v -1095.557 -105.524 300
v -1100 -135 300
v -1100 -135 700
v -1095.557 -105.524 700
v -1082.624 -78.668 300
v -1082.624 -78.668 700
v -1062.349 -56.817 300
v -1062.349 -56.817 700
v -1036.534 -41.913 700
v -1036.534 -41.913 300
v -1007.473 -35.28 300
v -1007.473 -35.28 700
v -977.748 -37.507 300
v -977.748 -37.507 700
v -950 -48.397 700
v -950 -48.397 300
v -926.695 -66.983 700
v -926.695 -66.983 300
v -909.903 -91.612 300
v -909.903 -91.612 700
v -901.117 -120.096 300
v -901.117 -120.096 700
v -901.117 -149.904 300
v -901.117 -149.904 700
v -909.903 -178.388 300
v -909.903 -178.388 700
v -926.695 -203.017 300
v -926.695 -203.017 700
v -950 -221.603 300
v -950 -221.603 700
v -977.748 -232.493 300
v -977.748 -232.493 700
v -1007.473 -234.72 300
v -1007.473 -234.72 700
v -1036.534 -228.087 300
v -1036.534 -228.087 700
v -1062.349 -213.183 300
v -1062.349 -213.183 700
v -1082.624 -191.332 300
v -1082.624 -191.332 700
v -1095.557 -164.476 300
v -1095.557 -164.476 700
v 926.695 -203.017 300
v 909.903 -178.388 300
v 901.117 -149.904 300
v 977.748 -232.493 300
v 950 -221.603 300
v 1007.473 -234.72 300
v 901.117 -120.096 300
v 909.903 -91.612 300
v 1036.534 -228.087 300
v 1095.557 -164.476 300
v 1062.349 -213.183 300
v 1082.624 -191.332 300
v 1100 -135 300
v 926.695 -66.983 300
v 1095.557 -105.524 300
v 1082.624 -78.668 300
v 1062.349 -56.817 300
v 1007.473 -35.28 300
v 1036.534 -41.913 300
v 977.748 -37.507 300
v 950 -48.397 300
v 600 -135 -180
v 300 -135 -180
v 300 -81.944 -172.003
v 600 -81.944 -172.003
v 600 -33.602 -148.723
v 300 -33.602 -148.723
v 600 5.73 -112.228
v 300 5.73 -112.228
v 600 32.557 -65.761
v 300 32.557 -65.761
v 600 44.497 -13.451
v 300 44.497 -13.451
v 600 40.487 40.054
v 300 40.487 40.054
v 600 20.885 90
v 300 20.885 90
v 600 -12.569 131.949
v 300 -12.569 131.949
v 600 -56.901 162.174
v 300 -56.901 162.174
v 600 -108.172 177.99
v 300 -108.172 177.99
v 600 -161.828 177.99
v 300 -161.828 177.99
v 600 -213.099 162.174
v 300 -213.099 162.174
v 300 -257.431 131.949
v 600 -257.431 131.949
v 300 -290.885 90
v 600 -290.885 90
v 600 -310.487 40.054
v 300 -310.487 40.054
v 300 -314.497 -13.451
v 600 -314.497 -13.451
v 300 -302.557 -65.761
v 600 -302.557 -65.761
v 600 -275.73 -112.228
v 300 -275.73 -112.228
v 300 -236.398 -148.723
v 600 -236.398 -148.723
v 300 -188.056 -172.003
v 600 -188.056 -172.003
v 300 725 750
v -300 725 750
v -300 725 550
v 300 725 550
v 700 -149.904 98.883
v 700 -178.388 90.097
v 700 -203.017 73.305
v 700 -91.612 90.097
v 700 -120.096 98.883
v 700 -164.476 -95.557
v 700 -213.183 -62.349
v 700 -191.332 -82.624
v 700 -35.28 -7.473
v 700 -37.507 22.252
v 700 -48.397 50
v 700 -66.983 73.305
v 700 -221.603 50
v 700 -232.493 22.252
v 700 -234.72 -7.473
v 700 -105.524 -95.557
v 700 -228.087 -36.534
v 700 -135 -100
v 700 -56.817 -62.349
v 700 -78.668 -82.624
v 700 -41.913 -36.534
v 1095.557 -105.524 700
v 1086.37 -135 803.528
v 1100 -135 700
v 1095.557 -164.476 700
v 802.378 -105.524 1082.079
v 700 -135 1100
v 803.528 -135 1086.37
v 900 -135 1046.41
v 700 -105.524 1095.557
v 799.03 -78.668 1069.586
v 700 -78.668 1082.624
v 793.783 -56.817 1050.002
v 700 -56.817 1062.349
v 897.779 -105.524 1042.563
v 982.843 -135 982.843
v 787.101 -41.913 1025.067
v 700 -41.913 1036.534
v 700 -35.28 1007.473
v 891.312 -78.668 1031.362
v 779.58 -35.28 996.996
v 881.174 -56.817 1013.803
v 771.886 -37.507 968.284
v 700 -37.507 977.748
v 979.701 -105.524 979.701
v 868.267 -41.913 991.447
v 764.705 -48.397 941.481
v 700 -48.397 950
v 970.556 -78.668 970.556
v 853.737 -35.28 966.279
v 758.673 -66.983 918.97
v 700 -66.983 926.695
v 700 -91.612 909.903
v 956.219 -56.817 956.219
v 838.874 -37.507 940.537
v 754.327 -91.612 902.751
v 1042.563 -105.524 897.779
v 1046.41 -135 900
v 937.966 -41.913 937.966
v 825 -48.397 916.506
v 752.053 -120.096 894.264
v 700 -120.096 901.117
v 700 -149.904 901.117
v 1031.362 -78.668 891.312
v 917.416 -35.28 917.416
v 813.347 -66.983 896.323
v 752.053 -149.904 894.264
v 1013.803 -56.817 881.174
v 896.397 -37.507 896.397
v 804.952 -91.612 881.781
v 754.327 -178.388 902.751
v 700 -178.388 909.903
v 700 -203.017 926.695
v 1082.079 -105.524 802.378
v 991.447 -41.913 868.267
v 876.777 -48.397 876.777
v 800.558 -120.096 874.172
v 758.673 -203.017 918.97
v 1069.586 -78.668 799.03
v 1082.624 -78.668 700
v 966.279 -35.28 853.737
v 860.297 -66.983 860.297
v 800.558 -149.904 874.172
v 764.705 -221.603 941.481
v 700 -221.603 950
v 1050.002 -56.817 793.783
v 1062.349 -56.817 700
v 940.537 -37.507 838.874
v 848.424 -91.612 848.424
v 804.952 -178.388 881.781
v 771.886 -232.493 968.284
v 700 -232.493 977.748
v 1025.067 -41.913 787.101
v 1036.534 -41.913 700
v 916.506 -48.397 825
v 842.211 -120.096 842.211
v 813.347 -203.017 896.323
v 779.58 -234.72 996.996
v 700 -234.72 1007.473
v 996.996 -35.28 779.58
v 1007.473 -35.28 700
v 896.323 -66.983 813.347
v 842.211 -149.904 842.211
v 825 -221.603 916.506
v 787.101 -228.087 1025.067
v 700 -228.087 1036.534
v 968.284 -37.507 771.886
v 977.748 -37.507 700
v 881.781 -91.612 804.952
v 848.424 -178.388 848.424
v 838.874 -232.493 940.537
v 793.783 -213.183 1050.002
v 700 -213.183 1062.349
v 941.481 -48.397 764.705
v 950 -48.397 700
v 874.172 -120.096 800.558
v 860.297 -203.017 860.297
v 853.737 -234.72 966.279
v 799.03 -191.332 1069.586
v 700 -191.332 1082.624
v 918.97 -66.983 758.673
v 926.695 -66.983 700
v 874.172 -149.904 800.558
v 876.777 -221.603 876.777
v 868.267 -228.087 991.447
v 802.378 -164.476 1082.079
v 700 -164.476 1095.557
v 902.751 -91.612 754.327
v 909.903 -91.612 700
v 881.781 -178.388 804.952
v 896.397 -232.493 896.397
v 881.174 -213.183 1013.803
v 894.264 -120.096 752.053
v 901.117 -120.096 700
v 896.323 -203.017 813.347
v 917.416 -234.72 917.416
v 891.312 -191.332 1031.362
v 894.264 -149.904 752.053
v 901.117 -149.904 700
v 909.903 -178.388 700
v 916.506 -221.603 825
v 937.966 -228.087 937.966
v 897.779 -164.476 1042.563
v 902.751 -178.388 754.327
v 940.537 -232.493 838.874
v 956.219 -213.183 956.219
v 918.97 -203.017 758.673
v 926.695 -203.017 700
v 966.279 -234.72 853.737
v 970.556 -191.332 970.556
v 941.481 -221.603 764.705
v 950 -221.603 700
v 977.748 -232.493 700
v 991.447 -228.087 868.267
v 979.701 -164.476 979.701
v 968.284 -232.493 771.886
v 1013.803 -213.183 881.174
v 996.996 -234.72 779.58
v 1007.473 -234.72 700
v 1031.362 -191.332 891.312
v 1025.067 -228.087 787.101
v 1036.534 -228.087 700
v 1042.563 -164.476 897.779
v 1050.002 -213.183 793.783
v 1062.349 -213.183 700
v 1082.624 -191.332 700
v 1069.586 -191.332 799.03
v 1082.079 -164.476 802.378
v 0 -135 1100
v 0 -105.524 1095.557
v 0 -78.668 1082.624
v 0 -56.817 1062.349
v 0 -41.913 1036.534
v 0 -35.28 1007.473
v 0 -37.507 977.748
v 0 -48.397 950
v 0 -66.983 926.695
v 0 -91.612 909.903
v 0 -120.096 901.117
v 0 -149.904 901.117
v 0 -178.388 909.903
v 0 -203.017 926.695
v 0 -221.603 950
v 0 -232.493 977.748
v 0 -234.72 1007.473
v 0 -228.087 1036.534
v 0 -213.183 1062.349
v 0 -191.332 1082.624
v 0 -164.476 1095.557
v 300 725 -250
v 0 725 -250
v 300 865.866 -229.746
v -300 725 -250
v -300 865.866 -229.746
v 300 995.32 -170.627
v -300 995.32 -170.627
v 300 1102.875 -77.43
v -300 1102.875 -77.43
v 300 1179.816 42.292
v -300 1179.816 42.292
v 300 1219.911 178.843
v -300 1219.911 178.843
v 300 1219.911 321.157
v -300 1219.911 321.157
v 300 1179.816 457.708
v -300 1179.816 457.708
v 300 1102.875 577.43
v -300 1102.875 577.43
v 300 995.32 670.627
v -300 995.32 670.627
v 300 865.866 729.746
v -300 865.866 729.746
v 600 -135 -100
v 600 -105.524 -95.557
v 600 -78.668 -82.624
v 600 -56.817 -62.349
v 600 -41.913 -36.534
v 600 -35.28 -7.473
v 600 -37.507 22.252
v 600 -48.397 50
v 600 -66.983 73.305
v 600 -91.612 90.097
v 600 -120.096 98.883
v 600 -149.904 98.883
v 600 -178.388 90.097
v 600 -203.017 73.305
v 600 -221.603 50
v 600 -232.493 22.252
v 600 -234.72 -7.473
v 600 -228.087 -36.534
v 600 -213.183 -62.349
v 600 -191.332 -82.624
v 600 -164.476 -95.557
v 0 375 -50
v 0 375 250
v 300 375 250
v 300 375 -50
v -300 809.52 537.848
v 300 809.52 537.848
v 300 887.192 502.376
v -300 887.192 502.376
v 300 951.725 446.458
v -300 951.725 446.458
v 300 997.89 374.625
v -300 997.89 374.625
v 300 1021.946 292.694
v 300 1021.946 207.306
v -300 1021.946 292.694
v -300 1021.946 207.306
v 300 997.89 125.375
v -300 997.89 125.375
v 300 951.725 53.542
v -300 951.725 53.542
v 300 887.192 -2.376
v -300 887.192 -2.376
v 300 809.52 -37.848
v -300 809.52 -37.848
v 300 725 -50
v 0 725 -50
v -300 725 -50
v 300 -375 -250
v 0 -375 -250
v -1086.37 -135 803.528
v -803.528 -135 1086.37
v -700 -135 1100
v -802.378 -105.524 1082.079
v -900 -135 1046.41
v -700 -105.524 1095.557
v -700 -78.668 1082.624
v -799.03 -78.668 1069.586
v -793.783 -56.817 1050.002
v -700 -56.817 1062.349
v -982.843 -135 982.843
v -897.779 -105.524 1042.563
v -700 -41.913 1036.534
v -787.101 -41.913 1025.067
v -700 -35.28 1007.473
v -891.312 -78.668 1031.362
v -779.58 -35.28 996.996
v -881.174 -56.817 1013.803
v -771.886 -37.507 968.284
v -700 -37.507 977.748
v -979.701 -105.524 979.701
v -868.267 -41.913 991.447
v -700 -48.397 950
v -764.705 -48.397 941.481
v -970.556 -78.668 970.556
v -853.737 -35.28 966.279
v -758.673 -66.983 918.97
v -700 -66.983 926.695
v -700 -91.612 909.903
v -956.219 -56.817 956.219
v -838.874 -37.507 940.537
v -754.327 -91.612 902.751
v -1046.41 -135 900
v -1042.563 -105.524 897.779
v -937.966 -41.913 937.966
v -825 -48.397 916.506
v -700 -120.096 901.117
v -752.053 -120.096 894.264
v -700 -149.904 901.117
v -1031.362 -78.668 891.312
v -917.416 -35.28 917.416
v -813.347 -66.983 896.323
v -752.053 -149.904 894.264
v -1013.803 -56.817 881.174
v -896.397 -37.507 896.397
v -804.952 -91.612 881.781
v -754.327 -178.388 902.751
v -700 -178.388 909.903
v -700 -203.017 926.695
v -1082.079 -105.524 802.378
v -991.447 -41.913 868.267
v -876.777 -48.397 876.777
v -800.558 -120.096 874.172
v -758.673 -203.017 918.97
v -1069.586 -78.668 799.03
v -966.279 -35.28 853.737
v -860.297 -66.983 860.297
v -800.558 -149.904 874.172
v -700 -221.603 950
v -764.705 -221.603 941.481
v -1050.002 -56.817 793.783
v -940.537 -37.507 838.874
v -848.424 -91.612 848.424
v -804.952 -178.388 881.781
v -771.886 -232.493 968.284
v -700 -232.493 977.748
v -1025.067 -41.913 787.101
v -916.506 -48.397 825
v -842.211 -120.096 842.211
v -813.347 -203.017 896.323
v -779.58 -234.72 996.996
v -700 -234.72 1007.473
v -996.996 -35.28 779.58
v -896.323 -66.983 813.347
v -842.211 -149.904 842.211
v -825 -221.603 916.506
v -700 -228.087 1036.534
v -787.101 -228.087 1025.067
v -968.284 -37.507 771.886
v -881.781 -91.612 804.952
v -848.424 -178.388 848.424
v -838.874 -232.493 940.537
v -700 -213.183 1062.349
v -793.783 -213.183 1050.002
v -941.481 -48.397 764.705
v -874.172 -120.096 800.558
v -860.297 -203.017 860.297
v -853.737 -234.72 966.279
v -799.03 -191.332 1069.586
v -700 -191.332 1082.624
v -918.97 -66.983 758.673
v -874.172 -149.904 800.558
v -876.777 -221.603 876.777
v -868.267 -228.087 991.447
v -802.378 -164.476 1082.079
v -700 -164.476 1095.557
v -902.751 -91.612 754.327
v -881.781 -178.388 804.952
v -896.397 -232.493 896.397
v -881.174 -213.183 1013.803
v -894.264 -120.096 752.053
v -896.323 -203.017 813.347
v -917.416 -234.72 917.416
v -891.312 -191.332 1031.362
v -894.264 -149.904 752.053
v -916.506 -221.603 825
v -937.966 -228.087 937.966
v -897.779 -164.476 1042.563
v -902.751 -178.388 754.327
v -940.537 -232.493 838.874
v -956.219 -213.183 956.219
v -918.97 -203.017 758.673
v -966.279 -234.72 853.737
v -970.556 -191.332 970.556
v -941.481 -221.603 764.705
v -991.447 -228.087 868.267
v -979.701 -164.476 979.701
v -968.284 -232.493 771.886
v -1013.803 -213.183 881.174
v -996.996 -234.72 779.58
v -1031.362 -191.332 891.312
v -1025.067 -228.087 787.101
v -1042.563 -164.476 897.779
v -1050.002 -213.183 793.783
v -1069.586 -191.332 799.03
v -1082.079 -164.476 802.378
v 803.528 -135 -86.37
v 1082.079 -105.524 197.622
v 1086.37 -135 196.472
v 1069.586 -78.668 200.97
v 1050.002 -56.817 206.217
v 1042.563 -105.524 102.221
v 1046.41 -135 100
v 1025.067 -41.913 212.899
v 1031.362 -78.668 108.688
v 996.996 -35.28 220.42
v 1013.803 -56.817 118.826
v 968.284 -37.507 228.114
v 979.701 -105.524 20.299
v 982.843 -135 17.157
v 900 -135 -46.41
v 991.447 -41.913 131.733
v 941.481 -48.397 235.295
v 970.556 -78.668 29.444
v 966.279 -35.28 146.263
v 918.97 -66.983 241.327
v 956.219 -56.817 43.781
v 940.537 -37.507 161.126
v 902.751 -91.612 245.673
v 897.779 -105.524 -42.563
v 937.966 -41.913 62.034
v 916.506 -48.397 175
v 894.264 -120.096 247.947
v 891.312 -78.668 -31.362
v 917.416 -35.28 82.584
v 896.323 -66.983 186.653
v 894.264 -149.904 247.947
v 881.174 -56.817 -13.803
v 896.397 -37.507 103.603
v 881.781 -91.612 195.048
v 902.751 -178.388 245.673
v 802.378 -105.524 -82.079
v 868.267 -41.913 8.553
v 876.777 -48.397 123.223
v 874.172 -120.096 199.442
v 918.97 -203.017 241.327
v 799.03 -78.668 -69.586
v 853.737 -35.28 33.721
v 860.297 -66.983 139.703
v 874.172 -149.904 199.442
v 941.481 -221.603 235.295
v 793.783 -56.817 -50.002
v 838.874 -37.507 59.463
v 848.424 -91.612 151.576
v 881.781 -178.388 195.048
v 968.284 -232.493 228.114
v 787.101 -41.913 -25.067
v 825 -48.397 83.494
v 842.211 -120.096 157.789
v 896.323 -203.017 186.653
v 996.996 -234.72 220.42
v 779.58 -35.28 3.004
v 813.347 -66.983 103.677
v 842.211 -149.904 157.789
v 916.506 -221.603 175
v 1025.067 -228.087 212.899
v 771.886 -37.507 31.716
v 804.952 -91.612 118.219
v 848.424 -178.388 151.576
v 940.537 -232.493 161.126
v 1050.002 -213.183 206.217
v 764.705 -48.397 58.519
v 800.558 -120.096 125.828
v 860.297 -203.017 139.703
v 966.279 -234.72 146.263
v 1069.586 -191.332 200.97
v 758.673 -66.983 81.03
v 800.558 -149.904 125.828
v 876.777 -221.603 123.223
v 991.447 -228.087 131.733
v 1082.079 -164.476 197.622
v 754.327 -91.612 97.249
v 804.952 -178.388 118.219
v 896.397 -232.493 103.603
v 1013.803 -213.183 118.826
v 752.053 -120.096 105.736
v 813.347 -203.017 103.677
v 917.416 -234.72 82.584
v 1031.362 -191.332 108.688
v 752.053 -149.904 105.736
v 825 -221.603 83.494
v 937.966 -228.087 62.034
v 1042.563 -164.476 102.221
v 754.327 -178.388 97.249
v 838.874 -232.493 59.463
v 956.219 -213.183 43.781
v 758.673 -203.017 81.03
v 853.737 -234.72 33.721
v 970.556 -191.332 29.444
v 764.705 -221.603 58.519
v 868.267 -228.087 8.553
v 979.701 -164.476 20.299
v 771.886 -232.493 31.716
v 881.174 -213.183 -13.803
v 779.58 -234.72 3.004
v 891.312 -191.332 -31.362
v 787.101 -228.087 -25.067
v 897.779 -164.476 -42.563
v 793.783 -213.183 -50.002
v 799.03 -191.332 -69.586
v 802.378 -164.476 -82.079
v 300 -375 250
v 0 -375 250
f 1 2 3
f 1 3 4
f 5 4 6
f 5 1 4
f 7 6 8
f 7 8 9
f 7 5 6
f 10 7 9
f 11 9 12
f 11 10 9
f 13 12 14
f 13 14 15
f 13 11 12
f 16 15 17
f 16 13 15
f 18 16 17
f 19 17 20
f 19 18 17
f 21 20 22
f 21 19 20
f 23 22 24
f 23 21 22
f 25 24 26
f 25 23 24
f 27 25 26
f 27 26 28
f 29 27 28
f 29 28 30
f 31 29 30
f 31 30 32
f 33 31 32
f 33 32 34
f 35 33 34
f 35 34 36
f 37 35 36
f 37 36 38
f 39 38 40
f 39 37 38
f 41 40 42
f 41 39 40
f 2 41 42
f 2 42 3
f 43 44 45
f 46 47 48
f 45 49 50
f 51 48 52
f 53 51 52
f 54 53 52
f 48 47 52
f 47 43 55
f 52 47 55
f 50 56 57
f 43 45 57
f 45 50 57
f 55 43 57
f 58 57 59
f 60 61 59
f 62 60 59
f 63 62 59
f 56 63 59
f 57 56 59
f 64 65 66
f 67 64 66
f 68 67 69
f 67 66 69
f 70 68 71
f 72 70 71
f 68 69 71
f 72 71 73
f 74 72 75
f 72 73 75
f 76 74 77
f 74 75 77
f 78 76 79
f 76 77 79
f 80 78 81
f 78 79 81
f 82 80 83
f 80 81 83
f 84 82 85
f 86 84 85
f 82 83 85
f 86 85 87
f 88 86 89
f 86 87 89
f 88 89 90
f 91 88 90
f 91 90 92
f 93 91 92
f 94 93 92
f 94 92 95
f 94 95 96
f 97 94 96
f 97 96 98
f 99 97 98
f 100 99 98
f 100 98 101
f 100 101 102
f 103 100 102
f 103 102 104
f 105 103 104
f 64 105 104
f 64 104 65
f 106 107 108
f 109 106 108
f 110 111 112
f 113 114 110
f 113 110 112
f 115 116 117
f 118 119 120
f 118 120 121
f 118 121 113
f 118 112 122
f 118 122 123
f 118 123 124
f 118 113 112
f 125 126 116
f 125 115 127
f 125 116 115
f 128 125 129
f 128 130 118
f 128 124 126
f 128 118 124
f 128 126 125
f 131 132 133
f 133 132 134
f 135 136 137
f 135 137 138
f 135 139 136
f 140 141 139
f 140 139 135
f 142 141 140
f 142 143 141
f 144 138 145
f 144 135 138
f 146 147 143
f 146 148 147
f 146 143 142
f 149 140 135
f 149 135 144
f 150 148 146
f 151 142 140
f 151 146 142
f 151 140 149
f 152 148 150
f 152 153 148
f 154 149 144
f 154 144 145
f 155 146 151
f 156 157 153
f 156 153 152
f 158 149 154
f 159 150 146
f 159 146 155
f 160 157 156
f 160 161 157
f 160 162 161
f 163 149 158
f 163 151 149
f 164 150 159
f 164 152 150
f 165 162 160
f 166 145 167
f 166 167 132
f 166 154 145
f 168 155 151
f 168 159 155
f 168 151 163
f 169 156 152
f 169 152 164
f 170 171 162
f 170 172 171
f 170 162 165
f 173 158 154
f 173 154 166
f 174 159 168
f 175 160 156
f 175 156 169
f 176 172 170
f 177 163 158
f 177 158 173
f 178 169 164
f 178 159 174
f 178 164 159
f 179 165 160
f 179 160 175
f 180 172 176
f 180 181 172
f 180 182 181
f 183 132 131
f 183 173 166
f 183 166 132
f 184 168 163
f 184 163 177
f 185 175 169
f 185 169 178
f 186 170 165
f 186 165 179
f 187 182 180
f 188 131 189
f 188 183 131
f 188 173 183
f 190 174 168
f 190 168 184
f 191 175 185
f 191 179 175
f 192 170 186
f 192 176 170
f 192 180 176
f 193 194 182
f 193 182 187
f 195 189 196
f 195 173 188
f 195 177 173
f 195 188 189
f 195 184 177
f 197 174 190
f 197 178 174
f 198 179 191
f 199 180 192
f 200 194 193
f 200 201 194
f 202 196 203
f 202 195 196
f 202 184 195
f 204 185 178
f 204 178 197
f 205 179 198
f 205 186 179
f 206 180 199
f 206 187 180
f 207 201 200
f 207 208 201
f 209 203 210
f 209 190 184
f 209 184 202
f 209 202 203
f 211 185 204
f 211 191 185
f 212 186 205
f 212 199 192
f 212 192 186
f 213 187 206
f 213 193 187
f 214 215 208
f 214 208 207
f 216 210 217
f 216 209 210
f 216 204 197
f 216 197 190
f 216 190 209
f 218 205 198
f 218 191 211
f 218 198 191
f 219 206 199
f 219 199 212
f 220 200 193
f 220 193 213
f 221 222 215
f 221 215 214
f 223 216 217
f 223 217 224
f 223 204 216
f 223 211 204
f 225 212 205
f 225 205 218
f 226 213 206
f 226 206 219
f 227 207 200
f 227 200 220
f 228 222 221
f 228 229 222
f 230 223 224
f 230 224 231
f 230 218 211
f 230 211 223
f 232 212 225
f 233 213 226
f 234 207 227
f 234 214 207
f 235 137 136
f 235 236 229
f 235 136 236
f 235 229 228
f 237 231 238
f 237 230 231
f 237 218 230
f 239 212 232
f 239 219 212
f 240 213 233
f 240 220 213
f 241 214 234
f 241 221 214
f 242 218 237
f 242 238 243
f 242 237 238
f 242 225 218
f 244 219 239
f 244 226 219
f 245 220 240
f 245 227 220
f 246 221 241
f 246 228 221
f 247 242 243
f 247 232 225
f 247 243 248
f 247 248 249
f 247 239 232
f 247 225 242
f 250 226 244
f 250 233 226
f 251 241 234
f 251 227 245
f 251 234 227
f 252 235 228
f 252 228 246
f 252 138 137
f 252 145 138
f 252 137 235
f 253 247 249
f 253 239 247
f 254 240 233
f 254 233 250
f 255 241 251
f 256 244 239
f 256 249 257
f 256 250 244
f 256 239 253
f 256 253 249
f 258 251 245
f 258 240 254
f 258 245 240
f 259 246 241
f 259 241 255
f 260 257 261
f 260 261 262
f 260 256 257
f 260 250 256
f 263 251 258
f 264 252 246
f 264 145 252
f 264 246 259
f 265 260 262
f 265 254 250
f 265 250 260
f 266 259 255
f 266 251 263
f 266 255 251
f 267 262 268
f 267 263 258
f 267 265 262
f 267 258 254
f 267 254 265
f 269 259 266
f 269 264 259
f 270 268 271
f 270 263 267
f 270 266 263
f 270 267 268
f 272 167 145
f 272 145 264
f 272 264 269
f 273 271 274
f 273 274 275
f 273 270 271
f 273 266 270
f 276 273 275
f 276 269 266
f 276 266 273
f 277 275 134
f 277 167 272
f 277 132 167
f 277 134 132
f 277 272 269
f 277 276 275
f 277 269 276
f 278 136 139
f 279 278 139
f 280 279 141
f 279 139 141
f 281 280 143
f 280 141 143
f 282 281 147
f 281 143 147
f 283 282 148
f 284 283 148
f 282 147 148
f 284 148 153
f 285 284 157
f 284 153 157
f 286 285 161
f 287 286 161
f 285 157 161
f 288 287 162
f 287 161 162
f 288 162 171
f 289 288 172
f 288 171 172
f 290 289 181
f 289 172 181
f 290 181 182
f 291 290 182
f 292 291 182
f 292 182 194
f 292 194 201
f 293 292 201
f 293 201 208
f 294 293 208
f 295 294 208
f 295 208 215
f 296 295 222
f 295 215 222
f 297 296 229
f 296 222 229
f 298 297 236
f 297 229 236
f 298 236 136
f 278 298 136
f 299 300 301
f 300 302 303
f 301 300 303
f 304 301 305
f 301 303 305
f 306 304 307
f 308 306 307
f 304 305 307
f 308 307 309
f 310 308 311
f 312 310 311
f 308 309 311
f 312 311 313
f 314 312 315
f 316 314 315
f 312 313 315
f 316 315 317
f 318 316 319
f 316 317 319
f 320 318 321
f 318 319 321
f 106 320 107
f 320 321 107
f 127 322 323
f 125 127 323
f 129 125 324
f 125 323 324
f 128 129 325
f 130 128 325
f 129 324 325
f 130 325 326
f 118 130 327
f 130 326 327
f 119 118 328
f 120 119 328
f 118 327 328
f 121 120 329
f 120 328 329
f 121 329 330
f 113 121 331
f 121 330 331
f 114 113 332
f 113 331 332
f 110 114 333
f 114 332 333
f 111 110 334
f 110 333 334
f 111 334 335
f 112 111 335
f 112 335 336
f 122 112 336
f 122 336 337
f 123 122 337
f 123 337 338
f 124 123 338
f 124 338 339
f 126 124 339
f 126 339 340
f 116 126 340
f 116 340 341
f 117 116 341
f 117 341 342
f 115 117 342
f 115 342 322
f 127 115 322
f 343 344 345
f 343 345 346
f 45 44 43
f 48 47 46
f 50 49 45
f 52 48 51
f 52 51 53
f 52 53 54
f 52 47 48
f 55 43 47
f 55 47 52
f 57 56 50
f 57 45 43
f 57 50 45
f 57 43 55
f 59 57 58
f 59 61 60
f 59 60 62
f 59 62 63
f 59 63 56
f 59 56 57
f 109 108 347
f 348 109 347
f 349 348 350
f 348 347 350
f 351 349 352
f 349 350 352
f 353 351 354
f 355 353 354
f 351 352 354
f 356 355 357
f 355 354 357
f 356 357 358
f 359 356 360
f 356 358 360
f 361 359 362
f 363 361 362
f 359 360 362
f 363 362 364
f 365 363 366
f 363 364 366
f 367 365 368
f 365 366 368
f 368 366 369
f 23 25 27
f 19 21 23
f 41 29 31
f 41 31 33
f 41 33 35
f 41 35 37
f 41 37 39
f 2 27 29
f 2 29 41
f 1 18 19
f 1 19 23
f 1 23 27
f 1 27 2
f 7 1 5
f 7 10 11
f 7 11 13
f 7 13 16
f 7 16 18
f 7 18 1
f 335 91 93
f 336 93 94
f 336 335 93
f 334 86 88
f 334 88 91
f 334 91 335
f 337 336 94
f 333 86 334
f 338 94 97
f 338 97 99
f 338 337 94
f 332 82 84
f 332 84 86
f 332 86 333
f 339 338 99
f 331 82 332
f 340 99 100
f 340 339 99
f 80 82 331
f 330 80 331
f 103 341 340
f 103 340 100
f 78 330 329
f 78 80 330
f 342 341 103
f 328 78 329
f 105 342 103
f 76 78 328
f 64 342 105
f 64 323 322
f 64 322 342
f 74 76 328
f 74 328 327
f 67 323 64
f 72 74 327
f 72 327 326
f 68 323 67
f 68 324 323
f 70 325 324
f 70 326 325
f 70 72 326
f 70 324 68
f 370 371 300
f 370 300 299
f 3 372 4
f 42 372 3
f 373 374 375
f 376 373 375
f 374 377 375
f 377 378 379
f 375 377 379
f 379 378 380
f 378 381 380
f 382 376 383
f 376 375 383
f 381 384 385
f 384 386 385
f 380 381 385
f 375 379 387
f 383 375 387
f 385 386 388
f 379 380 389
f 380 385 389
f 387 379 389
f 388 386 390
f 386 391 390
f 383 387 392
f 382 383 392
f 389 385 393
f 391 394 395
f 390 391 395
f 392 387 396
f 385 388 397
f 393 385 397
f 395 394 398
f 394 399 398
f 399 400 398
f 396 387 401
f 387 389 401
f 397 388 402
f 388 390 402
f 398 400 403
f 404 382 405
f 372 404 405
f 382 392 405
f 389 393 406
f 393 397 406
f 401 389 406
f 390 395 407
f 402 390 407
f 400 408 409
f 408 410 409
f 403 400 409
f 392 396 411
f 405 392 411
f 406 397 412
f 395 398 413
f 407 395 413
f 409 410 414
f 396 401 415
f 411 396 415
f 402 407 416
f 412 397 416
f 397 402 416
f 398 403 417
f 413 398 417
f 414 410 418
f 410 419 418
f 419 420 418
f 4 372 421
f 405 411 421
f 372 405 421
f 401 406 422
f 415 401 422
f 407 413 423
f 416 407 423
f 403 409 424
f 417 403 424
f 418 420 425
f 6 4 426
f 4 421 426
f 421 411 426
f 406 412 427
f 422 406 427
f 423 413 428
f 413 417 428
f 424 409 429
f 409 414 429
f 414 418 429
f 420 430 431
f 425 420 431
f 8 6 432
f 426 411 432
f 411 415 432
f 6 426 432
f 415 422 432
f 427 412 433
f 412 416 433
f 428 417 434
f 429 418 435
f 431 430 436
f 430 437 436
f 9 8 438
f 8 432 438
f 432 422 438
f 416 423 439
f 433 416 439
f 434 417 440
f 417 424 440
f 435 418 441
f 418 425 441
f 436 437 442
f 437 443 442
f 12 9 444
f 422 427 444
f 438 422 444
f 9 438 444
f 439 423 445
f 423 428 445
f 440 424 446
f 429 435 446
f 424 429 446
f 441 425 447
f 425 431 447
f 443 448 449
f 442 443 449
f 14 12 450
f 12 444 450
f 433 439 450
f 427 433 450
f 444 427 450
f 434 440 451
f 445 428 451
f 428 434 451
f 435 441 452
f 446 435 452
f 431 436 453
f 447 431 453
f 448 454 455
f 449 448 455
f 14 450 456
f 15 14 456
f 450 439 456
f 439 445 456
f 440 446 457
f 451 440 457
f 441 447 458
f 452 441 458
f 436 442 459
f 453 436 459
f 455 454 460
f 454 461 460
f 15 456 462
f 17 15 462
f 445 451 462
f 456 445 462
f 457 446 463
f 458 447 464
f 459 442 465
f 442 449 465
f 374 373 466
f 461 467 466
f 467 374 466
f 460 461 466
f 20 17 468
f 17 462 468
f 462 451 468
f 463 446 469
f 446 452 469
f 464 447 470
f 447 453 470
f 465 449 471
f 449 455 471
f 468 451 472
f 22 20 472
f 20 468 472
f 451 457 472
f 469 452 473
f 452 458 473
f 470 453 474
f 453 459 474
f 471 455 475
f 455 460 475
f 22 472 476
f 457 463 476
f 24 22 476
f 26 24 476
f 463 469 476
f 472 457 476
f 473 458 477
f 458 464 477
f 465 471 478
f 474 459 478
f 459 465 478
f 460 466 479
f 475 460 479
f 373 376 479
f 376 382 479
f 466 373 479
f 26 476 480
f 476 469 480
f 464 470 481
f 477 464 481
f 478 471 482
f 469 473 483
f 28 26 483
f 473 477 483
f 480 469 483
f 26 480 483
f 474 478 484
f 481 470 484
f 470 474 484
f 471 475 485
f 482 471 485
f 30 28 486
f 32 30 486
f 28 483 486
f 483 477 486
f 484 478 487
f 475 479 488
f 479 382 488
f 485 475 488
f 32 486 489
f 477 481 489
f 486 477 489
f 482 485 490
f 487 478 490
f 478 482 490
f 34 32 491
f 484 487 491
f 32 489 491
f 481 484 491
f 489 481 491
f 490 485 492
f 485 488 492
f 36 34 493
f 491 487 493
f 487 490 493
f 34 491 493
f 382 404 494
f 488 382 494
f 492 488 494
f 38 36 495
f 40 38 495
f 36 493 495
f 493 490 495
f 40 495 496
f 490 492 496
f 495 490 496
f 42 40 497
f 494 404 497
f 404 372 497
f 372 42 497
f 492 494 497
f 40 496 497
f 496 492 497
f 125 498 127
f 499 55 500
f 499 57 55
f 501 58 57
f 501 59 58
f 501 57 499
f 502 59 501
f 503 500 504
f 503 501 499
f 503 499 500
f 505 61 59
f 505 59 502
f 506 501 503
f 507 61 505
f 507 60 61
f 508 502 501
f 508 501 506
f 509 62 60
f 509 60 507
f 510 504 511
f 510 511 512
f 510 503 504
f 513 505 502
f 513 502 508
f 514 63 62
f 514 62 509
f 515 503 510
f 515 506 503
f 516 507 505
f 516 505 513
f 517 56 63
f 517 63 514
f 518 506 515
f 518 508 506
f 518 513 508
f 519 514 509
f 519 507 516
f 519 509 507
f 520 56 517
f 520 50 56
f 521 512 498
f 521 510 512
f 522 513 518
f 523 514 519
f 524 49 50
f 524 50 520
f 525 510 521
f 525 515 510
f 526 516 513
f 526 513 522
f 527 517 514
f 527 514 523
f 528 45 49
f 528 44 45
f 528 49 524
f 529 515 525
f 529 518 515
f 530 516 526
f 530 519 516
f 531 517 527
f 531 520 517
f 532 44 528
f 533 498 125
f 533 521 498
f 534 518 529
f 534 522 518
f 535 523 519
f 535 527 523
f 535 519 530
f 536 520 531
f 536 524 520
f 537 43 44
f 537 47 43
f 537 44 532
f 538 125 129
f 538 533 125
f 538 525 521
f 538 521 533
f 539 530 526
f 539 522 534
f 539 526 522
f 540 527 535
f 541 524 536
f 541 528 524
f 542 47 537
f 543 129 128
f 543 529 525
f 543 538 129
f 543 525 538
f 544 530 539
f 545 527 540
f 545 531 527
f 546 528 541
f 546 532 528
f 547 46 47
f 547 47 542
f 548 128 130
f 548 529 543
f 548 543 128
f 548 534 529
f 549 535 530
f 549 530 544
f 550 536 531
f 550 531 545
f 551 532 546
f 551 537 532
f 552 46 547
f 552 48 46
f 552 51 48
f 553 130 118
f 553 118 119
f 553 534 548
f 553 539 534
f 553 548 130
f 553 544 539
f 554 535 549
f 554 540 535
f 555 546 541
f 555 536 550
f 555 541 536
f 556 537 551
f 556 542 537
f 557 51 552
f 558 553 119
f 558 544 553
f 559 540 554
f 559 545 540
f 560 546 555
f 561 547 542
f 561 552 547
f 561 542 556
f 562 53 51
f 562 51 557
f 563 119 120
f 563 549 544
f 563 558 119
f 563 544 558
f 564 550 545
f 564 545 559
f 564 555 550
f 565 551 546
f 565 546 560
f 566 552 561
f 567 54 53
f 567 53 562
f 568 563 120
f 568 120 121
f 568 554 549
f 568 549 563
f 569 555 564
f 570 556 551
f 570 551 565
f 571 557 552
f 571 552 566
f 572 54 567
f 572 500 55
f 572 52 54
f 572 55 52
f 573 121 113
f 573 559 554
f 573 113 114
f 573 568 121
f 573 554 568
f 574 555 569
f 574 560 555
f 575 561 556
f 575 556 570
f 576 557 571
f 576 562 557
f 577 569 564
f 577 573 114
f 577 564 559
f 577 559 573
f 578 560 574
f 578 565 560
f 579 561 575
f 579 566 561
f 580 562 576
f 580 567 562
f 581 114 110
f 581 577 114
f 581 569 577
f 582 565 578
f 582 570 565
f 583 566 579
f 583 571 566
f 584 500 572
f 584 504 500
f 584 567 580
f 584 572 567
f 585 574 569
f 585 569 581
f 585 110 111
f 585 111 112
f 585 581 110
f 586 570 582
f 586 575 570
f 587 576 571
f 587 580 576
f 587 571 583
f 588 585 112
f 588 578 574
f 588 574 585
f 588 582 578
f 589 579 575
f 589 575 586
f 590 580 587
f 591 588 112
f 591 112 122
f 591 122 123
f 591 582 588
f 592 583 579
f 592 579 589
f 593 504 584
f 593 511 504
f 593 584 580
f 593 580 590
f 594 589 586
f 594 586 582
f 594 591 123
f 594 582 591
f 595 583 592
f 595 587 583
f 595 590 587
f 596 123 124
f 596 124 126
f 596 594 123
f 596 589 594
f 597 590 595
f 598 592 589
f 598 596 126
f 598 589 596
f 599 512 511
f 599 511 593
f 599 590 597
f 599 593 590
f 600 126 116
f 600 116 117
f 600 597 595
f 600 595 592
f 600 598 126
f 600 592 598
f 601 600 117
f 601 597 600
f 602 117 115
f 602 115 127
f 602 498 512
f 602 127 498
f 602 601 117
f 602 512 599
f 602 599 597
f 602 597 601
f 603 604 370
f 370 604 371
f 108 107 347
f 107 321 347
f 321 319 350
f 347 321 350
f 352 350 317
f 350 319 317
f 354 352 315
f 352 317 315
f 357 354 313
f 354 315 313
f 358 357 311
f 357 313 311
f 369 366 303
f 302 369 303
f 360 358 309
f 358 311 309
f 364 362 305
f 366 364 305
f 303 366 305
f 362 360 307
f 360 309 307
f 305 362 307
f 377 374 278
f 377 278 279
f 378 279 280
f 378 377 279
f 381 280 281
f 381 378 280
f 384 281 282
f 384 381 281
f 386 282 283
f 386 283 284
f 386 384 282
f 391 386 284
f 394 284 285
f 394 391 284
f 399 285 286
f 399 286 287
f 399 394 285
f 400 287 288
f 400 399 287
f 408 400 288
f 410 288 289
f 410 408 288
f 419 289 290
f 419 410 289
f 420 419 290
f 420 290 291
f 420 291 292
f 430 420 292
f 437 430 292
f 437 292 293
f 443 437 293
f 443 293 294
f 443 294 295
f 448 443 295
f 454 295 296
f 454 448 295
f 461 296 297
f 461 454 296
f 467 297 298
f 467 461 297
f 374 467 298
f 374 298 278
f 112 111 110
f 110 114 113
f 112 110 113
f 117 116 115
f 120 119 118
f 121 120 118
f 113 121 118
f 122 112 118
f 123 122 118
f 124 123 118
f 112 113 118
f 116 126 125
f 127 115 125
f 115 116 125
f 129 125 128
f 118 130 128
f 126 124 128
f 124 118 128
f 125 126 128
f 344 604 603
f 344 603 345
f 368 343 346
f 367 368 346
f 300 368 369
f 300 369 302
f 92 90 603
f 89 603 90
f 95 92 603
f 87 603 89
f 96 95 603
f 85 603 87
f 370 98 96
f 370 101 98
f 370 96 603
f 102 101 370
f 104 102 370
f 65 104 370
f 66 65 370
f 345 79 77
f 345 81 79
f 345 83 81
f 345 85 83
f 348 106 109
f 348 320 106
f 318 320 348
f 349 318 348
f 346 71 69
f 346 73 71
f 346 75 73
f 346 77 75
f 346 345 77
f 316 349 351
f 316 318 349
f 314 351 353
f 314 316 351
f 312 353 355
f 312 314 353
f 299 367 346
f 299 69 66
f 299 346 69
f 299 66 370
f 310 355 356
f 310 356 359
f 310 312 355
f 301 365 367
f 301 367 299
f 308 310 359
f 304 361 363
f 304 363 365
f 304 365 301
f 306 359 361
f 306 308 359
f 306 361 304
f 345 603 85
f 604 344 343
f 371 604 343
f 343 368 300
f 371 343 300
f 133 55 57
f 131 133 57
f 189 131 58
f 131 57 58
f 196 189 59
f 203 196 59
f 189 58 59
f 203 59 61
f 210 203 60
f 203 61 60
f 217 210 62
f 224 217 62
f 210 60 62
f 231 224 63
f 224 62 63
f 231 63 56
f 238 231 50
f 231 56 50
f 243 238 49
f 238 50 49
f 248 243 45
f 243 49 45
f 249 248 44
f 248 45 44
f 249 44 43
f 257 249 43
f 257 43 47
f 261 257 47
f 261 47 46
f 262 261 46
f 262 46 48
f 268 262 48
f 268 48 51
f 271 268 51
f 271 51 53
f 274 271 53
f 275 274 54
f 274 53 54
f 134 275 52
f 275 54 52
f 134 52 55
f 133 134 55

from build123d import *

# Parameters (mm, degrees)
ESBO_O1_R                 = 100
RESSALTO_EXTRUS_O2_DEPTH  = 700
ESBO_O1_9_R               = 180
ESBO_O1_9_R_2             = 100
RESSALTO_EXTRUS_O6_DEPTH  = 600
ESBO_O1_10_W              = 500
ESBO_O1_10_H              = 750
ESBO_O1_10_R              = 180
RESSALTO_EXTRUS_O7_DEPTH  = 300
ESBO_O3_W                 = 300
ESBO_O3_H                 = 200
RESSALTO_EXTRUS_O8_DEPTH  = 350
RESSALTO_EXTRUS_O9_DEPTH  = 300
VARREDURA4_OUTLINE_R      = 100
VARREDURA4_ANGLE          = 90
ESBO_O27_R                = 100
RESSALTO_EXTRUS_O16_DEPTH = 400
VARREDURA5_OUTLINE_R      = 100
VARREDURA5_ANGLE          = 90
ESBO_O33_R                = 100
RESSALTO_EXTRUS_O17_DEPTH = 700


# Read off the part's stored shape, not the designer's step: Varredura4, Varredura5
with BuildPart() as part:
    # Esboço1 → Ressalto-extrusão2 (new body)
    with BuildSketch(Plane(origin=(0, 0, 0), x_dir=(0, 0, -1), z_dir=(1, 0, 0))):
        with Locations((0, -135)):
            Circle(ESBO_O1_R)
    extrude(amount=RESSALTO_EXTRUS_O2_DEPTH)

    # Esboço1<9> → Ressalto-extrusão6 (add)
    with BuildSketch(Plane(origin=(0, 0, 0), x_dir=(0, 0, -1), z_dir=(1, 0, 0))):
        with Locations((0, -135)):
            Circle(ESBO_O1_9_R)
        with Locations((0, -135)):
            Circle(ESBO_O1_9_R_2, mode=Mode.SUBTRACT)
    extrude(amount=RESSALTO_EXTRUS_O6_DEPTH)

    # Esboço1<10> → Ressalto-extrusão7 (add)
    with BuildSketch(Plane(origin=(0, 0, 0), x_dir=(0, 0, -1), z_dir=(1, 0, 0))):
        Rectangle(ESBO_O1_10_W, ESBO_O1_10_H)
        with Locations((0, -135)):
            Circle(ESBO_O1_10_R, mode=Mode.SUBTRACT)
    extrude(amount=RESSALTO_EXTRUS_O7_DEPTH)

    # Esboço3 → Ressalto-extrusão8 (add)
    with BuildSketch(Plane(origin=(0, 375, 0), x_dir=(1, 0, 0), z_dir=(0, 1, 0))):
        with Locations((150, 150)):
            Rectangle(ESBO_O3_W, ESBO_O3_H)
    extrude(amount=RESSALTO_EXTRUS_O8_DEPTH)

    # Esboço5 → Ressalto-extrusão9 (add)
    with BuildSketch(Plane(origin=(300, 0, 0), x_dir=(0, 0, -1), z_dir=(1, 0, 0))):
        with BuildLine():
            Line((-750, 725), (-550, 725))
            ThreePointArc((-550, 725), (-250, 1025), (50, 725))
            Line((50, 725), (250, 725))
            ThreePointArc((250, 725), (-250, 1225), (-750, 725))
        make_face()
    ressalto_extrus_o9 = extrude(amount=-RESSALTO_EXTRUS_O9_DEPTH)

    # Espelhar3: Ressalto-extrusão9 across Right Plane
    add(ressalto_extrus_o9.mirror(Plane(origin=(0, 0, 0), x_dir=(0, 0, -1), z_dir=(1, 0, 0))))


with BuildPart() as body_2:
    # Varredura4 outline → Varredura4 (revolve)
    with BuildSketch(Plane(origin=(700, 0, 300), x_dir=(1, 0, 0), z_dir=(0, 0, 1))):
        with Locations((300, -135)):
            Circle(VARREDURA4_OUTLINE_R)
    revolve(axis=Axis((700, 0, 300), (0, 1, 0)), revolution_arc=VARREDURA4_ANGLE)


with BuildPart() as body_3:
    # Esboço27 → Ressalto-extrusão16 (new body)
    with BuildSketch(Plane.XY.offset(300)):
        with Locations((1000, -135)):
            Circle(ESBO_O27_R)
    ressalto_extrus_o16 = extrude(amount=RESSALTO_EXTRUS_O16_DEPTH)

    # Varredura5 outline → Varredura5 (revolve)
    with BuildSketch(Plane(origin=(700, 0, 700), x_dir=(0, 0, 1), z_dir=(-1, 0, 0))):
        with Locations((300, -135)):
            Circle(VARREDURA5_OUTLINE_R)
    varredura5 = revolve(axis=Axis((700, 0, 700), (0, 1, 0)), revolution_arc=VARREDURA5_ANGLE)

    # Esboço33 → Ressalto-extrusão17 (add)
    with BuildSketch(Plane.ZY.offset(-700)):
        with Locations((1000, -135)):
            Circle(ESBO_O33_R)
    ressalto_extrus_o17 = extrude(amount=RESSALTO_EXTRUS_O17_DEPTH)

    # Espelhar4: Ressalto-extrusão16, Varredura5, Ressalto-extrusão17 across Right Plane
    add(ressalto_extrus_o16.mirror(Plane(origin=(0, 0, 0), x_dir=(0, 0, -1), z_dir=(1, 0, 0))))
    add(varredura5.mirror(Plane(origin=(0, 0, 0), x_dir=(0, 0, -1), z_dir=(1, 0, 0))))
    add(ressalto_extrus_o17.mirror(Plane(origin=(0, 0, 0), x_dir=(0, 0, -1), z_dir=(1, 0, 0))))


solid = Compound([part.part, body_2.part, body_3.part])
